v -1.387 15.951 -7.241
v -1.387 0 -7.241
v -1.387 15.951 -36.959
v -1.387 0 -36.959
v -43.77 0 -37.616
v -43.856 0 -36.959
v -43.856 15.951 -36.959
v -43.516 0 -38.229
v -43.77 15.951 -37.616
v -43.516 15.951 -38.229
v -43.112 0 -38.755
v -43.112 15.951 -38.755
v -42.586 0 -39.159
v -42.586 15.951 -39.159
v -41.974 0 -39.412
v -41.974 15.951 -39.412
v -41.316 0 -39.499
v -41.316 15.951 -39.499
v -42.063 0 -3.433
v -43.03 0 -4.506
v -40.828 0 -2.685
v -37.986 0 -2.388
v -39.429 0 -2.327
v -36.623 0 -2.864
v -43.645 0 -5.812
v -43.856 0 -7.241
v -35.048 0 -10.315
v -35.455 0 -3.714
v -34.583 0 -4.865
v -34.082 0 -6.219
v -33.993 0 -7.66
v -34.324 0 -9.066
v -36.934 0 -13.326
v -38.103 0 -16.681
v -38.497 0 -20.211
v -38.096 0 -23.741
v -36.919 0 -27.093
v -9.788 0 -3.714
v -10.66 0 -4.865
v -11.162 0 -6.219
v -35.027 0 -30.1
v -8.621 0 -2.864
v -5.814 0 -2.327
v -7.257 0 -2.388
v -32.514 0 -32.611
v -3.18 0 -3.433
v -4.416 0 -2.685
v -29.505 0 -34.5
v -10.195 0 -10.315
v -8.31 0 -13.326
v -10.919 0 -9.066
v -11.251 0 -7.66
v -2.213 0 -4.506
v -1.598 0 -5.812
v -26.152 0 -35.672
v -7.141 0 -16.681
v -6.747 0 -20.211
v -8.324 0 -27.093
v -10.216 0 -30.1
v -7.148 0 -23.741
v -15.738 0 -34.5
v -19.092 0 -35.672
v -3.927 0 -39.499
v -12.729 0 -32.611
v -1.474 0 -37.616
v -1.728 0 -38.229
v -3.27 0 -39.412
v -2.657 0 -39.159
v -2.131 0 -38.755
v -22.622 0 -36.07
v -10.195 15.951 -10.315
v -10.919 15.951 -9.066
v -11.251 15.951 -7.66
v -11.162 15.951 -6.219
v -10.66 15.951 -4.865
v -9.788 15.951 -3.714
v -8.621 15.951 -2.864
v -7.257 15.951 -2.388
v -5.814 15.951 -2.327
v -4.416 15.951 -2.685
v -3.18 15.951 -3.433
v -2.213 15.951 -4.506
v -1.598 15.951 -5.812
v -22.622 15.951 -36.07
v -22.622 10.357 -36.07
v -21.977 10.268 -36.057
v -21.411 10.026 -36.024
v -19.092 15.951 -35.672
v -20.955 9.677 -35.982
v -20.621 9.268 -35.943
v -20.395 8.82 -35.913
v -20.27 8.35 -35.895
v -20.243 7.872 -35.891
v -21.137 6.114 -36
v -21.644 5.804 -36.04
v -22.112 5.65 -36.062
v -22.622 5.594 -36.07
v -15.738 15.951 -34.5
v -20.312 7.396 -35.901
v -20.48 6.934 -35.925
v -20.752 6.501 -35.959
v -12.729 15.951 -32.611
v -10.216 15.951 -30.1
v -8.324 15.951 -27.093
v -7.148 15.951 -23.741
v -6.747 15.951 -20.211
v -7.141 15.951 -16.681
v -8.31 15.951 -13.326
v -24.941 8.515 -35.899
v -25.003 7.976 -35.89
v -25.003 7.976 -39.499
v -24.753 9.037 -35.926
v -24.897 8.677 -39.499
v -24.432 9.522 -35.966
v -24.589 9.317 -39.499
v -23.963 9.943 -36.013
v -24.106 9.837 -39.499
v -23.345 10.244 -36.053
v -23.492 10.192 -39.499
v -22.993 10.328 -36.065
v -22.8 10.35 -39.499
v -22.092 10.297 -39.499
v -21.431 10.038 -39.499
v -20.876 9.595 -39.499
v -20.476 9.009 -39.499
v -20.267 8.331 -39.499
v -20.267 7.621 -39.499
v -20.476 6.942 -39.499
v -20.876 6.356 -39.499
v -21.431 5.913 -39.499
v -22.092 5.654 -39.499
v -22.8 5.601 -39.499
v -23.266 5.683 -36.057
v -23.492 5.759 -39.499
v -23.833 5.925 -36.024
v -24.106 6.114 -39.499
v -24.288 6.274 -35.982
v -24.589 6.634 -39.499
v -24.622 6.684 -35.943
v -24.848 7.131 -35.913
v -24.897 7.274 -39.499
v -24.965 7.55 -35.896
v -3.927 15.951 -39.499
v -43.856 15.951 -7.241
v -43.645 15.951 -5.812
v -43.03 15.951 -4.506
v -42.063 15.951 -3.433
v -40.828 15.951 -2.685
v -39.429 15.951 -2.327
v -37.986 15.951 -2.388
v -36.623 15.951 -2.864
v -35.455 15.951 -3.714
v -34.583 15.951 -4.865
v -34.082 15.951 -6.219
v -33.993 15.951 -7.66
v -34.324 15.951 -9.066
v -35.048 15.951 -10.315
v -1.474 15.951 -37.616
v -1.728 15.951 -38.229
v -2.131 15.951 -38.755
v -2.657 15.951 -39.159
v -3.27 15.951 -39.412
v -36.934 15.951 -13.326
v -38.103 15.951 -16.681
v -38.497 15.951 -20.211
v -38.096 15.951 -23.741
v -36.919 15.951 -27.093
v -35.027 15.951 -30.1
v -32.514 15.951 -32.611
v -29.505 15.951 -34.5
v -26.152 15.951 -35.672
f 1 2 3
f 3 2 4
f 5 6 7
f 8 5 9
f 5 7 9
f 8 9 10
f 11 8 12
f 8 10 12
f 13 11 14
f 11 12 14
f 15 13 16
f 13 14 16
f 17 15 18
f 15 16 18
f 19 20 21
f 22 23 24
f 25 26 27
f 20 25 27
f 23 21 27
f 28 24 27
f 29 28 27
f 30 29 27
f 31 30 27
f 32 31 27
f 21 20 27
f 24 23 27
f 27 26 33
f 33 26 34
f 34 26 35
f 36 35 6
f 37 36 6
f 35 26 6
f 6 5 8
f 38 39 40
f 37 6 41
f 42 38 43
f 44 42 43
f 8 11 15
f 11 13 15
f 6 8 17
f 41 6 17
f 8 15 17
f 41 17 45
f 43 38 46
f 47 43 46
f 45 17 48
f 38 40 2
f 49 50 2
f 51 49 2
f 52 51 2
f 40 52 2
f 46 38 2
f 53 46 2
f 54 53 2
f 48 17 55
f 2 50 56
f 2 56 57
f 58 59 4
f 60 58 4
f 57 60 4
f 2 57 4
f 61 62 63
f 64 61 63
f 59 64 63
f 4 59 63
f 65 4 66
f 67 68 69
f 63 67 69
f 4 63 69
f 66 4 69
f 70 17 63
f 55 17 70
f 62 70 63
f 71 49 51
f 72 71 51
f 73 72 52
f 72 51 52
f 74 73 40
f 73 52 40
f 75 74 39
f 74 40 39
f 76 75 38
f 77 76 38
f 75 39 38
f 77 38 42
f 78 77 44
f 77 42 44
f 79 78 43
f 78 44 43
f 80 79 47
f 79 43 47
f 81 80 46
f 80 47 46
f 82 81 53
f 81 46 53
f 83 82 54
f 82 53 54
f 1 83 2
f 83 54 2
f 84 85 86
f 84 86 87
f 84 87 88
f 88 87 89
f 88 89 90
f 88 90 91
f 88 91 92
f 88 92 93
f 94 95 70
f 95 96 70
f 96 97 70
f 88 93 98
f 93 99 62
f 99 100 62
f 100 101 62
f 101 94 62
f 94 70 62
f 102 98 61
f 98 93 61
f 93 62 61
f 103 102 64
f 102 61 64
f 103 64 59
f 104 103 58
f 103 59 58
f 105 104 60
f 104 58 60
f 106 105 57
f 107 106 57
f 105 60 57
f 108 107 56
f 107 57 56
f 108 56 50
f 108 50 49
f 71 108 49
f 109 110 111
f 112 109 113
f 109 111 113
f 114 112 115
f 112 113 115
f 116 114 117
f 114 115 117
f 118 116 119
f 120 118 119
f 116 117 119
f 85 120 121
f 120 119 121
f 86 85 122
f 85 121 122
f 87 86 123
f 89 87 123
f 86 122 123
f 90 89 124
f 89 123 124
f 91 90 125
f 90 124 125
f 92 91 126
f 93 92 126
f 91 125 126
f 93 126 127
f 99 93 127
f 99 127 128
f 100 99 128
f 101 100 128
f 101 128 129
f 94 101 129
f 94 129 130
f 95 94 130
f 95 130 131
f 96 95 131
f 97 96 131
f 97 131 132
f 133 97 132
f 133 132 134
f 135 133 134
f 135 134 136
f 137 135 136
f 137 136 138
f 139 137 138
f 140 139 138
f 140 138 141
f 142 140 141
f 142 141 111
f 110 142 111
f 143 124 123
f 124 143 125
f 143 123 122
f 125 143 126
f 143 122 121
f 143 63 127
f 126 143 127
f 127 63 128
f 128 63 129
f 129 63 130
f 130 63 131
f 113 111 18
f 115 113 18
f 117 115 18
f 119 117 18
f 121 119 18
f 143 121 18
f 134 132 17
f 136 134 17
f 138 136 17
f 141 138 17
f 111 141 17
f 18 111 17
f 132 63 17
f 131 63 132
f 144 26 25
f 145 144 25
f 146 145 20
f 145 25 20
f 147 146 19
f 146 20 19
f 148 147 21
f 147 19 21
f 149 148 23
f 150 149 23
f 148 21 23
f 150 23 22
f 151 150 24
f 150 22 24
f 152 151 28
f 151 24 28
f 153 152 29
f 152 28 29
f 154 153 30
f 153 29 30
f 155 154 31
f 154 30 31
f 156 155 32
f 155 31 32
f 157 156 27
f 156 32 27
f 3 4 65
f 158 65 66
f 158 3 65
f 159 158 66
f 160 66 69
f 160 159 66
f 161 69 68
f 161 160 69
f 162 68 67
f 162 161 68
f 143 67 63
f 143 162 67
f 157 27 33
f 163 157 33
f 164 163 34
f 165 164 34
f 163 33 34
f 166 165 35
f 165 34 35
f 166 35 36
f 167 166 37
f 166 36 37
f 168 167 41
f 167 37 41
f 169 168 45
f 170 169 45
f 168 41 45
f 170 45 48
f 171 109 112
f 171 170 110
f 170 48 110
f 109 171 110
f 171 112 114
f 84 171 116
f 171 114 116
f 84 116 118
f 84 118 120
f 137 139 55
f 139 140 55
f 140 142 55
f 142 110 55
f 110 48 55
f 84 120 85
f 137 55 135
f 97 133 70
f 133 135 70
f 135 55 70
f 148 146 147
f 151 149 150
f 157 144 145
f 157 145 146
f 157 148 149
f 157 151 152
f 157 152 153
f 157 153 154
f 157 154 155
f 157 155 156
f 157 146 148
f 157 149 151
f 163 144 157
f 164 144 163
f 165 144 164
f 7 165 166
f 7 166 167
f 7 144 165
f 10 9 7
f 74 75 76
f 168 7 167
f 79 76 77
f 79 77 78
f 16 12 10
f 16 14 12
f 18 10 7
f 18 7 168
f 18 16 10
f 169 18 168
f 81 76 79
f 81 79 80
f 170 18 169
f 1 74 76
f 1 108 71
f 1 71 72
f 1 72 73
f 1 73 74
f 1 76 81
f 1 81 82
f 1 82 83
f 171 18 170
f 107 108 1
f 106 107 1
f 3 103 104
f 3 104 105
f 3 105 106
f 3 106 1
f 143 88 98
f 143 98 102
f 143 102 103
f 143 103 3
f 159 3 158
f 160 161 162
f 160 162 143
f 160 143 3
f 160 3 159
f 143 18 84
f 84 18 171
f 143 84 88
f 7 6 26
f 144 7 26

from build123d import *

# Parameters (mm, degrees)
BOSS_EXTRUDE1_DEPTH = 15.9512
FILLET1_R           = 2.54
SKETCH3_R           = 2.38125
CUT_EXTRUDE1_DEPTH  = 60.67865116


with BuildPart() as part:
    # Sketch2 → Boss-Extrude1 (new body)
    with BuildSketch(Plane(origin=(0, 0, 0), x_dir=(1, 0, 0), z_dir=(0, 1, 0))):
        with BuildLine():
            Line((-43.856127716, 39.498822447), (-43.856127716, 7.240822447))
            ThreePointArc((-43.856127716, 7.240822447), (-37.287152217, 2.576192047), (-35.048092212, 10.315496032))
            ThreePointArc((-35.048092212, 10.315496032), (-36.919453616, 27.093420789), (-22.621727716, 36.069822447))
            Line((-22.621727716, 36.069822447), (-22.621727716, 39.498822447))
            Line((-22.621727716, 39.498822447), (-43.856127716, 39.498822447))
        make_face()
        with BuildLine():
            Line((-1.387327716, 39.498822447), (-22.621727716, 39.498822447))
            Line((-22.621727716, 39.498822447), (-22.621727716, 36.069822447))
            ThreePointArc((-22.621727716, 36.069822447), (-8.324001816, 27.093420789), (-10.19536322, 10.315496032))
            ThreePointArc((-10.19536322, 10.315496032), (-7.956303215, 2.576192047), (-1.387327716, 7.240822447))
            Line((-1.387327716, 7.240822447), (-1.387327716, 39.498822447))
        make_face()
    extrude(amount=BOSS_EXTRUDE1_DEPTH)

    # Fillet1
    fillet1_edges = [part.edges().sort_by_distance(p)[0] for p in [
        (-43.856127716, 7.9756, -39.498822447),
        (-1.387327716, 7.9756, -39.498822447),
    ]]
    fillet(fillet1_edges, radius=FILLET1_R)

    # Sketch3 → Cut-Extrude1 (cut, through all)
    with BuildSketch(Plane(origin=(0, 0, -39.498822447), x_dir=(-1, 0, 0), z_dir=(0, 0, -1))):
        with Locations((22.621727716, 7.9756)):
            Circle(SKETCH3_R)
    extrude(amount=-CUT_EXTRUDE1_DEPTH, mode=Mode.SUBTRACT)


solid = part.part
